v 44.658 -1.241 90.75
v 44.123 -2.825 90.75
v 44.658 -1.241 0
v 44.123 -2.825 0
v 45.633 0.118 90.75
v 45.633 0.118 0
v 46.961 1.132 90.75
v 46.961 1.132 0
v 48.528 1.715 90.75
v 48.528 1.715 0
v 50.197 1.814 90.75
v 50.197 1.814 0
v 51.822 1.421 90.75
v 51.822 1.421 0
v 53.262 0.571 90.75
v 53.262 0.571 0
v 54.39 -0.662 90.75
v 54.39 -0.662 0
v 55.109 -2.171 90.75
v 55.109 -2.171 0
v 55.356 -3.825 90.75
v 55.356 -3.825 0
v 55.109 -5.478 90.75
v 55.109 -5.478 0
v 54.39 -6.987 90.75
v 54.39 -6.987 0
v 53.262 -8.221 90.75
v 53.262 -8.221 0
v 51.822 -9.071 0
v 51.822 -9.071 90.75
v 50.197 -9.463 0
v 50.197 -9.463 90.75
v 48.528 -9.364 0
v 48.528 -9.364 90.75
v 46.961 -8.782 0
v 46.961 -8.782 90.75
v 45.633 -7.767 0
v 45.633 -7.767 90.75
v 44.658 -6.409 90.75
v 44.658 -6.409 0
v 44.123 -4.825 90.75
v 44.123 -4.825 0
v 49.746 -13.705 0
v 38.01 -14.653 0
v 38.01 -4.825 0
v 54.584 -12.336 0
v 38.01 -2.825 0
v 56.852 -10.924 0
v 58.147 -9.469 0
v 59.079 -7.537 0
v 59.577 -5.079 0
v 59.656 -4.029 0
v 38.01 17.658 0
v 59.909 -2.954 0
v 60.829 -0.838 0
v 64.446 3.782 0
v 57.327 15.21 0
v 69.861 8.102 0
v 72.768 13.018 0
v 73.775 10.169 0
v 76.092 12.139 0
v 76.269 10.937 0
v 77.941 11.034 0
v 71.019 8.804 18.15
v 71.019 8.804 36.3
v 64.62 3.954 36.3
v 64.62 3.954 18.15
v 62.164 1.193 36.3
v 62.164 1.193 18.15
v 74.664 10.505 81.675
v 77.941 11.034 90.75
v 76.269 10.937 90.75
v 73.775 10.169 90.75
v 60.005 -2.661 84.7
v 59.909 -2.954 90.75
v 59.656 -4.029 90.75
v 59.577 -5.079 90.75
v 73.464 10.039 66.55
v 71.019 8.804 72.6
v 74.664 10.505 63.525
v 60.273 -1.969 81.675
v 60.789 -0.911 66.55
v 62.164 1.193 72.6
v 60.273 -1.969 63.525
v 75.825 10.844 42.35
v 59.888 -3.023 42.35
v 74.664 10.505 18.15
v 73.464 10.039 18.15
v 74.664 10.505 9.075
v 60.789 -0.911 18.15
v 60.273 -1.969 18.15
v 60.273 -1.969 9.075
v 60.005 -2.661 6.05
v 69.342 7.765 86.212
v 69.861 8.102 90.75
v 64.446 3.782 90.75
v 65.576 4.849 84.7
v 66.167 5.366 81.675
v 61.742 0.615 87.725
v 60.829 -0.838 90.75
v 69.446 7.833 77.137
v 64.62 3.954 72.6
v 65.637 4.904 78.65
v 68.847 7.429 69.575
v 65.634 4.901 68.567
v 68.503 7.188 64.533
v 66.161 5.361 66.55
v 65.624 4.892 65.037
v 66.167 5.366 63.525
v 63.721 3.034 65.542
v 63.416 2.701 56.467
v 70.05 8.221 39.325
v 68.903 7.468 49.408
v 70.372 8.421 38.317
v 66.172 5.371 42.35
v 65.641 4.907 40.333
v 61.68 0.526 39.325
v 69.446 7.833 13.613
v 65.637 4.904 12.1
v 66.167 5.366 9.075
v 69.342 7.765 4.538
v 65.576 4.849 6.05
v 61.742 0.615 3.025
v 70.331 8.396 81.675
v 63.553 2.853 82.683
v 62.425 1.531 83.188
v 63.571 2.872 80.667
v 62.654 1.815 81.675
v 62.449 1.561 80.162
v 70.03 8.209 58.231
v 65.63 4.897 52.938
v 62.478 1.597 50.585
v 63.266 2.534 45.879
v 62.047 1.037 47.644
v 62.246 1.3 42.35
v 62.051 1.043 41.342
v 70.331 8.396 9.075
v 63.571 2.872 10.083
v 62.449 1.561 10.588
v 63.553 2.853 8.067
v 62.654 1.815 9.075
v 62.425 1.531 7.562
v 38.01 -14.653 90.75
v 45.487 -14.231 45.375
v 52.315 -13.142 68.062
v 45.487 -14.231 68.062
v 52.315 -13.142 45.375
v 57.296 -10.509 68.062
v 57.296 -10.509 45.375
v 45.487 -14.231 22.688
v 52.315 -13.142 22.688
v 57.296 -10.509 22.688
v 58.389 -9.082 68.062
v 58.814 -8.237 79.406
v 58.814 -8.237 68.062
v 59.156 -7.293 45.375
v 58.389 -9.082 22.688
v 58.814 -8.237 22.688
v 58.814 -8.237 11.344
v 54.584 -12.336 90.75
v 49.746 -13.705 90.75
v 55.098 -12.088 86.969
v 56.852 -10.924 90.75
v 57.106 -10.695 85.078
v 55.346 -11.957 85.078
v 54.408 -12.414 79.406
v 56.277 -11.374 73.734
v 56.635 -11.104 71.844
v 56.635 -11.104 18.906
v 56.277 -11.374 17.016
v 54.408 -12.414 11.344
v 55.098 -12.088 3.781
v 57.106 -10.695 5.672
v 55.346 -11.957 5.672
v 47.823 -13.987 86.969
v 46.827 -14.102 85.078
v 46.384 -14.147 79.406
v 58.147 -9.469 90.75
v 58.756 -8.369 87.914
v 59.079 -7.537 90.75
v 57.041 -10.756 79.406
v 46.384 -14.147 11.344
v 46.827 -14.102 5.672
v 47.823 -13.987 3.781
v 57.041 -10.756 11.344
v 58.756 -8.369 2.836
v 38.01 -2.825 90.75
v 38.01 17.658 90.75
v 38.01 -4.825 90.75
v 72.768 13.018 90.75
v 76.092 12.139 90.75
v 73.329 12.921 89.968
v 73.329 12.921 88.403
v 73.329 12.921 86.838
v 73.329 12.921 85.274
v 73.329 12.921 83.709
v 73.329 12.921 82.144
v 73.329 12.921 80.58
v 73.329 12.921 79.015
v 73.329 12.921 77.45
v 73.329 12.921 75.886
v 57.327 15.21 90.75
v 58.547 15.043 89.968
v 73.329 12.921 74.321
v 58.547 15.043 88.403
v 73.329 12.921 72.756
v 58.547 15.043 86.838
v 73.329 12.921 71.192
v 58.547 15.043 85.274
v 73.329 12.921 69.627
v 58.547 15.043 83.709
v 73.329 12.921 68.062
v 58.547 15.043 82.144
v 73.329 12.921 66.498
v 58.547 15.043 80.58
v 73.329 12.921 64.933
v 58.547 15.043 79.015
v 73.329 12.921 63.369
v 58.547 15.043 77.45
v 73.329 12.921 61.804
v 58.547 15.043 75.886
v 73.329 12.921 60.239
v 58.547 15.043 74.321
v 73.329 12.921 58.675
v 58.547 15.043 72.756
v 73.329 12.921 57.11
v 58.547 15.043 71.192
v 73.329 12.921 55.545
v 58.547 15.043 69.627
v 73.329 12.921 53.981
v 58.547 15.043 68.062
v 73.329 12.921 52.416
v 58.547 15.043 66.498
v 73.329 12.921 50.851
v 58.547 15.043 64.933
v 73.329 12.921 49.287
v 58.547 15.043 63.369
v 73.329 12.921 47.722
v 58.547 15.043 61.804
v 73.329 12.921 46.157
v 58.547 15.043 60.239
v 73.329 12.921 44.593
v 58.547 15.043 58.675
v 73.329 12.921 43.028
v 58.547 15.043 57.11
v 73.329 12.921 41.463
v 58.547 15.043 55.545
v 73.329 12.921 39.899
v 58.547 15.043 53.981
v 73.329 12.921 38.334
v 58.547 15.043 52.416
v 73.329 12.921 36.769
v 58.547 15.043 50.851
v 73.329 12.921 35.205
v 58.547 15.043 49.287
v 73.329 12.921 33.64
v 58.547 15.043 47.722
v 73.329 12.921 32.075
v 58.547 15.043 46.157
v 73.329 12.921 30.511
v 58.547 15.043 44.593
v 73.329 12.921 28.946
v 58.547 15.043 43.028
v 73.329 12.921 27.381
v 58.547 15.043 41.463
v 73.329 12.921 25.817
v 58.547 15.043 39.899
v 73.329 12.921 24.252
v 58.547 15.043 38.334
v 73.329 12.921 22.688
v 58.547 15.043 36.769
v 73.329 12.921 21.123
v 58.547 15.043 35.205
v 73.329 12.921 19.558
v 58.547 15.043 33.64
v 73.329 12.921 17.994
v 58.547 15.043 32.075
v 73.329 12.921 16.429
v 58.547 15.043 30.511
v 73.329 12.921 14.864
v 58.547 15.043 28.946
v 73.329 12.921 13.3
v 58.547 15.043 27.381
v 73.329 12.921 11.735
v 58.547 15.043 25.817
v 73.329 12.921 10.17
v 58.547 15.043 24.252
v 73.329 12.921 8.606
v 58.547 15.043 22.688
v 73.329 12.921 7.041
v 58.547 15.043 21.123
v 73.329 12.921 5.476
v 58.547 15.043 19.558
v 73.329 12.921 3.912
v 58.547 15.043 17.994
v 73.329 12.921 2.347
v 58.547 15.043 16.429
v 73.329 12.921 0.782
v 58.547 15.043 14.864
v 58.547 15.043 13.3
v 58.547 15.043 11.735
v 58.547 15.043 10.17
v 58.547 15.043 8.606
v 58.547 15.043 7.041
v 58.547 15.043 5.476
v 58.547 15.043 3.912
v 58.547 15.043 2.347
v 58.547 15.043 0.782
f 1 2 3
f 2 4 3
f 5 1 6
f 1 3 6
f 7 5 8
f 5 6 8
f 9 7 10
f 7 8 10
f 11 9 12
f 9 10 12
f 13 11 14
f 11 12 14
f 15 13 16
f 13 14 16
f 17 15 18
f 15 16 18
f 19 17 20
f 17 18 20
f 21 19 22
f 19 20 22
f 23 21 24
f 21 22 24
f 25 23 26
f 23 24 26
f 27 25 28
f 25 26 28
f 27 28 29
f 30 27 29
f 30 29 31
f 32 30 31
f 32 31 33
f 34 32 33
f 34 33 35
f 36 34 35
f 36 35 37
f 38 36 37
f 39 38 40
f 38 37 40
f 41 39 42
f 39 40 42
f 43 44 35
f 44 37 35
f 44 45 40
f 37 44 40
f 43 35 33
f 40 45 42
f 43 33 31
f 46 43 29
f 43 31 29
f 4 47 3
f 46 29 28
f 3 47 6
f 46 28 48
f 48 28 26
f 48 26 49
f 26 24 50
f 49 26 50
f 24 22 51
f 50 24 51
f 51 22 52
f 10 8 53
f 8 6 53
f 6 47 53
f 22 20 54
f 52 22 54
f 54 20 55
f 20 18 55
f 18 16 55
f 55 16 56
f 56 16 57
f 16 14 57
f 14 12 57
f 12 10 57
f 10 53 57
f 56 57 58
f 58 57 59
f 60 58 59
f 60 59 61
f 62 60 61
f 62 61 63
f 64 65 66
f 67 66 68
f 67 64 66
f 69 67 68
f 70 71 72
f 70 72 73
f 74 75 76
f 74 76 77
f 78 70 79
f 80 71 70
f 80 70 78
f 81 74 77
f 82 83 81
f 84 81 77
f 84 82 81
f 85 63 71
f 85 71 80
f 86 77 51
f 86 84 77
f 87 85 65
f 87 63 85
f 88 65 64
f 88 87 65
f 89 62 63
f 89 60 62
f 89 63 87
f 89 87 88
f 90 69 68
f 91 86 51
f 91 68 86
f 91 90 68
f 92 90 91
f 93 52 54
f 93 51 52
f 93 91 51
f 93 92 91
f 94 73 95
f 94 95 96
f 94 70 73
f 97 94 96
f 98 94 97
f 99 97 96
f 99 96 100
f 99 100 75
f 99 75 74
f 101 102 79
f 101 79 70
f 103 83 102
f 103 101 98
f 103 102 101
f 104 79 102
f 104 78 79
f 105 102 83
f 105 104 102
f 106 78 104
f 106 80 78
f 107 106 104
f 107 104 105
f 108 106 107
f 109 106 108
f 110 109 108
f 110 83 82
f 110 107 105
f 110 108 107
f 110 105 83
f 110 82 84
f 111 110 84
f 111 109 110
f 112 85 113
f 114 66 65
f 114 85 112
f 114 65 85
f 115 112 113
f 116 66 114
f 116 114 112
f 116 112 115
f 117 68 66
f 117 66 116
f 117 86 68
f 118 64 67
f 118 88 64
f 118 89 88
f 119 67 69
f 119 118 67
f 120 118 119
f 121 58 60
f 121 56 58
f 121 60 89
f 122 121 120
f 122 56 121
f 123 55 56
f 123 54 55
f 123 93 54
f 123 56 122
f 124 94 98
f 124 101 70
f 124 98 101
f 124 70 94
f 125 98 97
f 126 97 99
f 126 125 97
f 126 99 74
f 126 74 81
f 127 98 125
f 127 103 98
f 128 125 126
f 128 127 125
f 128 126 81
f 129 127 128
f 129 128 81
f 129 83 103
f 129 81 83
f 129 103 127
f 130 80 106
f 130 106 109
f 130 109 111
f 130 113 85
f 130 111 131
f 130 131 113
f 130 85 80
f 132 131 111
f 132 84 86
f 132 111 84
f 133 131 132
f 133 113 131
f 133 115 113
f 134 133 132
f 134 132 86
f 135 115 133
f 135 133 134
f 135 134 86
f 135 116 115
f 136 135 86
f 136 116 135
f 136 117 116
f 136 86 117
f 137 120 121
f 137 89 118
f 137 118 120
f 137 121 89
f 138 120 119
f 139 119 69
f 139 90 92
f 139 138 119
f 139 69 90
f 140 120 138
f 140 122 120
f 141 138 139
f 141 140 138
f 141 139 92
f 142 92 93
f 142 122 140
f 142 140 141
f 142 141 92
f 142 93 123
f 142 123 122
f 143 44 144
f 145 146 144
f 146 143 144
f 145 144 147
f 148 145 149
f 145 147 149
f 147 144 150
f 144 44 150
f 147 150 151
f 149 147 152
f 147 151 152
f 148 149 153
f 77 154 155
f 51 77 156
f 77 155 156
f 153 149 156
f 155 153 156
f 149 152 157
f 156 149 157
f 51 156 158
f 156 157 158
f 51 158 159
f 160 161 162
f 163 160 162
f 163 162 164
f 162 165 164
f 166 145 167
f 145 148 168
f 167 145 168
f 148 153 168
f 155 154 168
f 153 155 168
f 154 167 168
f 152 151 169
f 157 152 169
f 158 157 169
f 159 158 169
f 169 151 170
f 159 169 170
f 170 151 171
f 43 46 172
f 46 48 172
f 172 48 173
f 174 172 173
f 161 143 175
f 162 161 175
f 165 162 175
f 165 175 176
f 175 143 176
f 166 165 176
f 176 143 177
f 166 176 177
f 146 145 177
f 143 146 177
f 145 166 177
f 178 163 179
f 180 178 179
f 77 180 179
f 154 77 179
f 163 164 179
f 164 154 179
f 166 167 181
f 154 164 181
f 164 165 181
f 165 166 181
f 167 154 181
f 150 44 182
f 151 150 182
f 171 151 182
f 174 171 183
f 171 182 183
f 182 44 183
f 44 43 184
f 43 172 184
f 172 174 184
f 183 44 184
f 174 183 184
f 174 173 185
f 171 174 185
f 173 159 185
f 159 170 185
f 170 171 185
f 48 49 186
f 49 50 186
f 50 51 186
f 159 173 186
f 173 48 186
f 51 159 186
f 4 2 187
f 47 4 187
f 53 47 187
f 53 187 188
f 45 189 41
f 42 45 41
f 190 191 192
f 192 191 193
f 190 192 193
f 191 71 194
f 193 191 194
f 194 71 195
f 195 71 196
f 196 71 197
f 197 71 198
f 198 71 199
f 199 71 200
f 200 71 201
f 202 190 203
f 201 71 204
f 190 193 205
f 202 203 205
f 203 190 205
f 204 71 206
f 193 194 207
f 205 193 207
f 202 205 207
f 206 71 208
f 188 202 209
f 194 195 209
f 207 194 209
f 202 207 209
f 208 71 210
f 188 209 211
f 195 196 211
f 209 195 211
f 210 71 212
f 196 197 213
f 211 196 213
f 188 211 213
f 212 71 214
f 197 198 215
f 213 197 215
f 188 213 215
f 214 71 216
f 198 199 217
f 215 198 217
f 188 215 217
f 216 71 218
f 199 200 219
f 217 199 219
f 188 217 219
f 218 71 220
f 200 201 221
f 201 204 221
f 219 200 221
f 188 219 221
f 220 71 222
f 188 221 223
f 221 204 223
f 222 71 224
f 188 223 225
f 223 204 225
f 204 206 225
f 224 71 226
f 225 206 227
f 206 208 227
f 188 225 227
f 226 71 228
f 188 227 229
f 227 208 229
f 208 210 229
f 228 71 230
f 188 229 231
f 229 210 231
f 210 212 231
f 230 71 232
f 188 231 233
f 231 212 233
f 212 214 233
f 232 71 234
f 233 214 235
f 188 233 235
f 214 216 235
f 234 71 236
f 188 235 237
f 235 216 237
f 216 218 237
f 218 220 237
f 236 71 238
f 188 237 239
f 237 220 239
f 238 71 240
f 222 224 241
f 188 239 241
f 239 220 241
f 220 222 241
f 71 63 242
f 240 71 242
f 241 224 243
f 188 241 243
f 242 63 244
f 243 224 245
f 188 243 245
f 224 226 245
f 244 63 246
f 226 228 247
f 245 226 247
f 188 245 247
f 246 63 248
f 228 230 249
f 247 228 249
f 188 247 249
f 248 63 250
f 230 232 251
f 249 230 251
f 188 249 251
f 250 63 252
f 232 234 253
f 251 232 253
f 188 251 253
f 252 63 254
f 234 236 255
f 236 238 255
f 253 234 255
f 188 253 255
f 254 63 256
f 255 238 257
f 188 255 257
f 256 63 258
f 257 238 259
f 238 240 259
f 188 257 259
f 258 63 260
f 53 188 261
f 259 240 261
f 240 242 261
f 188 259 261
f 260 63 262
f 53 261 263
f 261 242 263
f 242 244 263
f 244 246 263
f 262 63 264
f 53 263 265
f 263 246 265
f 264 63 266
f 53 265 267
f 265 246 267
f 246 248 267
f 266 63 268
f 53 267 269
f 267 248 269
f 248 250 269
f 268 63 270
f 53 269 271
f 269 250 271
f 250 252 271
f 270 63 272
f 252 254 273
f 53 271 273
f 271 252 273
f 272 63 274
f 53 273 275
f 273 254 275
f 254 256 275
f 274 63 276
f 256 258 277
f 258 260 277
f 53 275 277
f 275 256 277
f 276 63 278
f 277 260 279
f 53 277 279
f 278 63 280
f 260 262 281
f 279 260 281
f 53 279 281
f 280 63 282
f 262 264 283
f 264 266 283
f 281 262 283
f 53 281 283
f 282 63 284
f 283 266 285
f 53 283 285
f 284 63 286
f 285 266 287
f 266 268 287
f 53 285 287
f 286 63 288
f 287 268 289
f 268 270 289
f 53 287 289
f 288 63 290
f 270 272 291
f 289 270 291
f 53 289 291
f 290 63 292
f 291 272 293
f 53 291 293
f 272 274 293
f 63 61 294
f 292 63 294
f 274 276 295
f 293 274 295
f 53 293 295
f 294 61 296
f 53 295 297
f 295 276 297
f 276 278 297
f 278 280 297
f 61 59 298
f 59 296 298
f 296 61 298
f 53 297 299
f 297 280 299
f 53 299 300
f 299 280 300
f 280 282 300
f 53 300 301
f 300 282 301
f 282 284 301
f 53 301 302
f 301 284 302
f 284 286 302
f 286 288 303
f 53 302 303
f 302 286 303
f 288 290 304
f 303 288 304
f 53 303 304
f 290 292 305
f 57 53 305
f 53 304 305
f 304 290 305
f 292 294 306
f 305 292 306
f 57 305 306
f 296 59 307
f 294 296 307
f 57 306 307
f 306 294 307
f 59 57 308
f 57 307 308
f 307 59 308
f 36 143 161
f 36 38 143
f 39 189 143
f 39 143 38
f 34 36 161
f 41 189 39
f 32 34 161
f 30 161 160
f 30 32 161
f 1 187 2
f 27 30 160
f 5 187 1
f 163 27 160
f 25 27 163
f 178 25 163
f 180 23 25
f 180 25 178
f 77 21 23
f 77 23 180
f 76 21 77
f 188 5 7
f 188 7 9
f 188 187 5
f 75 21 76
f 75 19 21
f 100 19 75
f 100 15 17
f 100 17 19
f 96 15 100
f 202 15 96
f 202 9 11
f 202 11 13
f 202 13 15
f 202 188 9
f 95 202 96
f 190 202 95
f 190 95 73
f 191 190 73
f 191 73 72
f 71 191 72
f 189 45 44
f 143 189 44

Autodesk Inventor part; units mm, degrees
ref_plane "YZ Plane" through (0, 0, 0) normal (1, 0, 0) x (0, 1, 0)
ref_plane "XZ Plane" through (0, 0, 0) normal (0, 1, 0) x (-1, 0, 0)
ref_plane "XY Plane" through (0, 0, 0) normal (0, 0, 1) x (1, 0, 0)
sketch "Sketch3" plane through (0, 0, 0) normal (0, 0, 1) x (1, 0, 0)
  line L0 (-80.5781, 0.8246) -> (-80.5781, 20.7988) construction
  circle A0 centre (-80.5781, 0.8246) radius 13.481
  line L1 (-53.7179, 12.5571) -> (-53.7179, -10.9927)
  arc A1 (-53.7179, -10.9927) -> (-51.5054, -12.9814) centre (-51.7179, -10.9927) ccw
  arc A2 (-51.5054, 14.5458) -> (-53.7179, 12.5571) centre (-51.7179, 12.5571) ccw
  line L2 (36.2229, -3.6088) -> (-51.5054, -12.9814)
  line L3 (38.0104, 3.1845) -> (38.0104, -1.6201)
  line L4 (-80.5781, 0.8246) -> (49.5525, 0.8246) construction
  circle A3 centre (49.6953, -3.8247) radius 5.6609
  line L5 (59.6953, 14.884) -> (59.6953, -12.7998) construction
  spline S0 degree 4 poles (77.9414, 11.0338) (75.5683, 12.9654) (71.7145, 13.0272) (66.8099, 13.9036) (60.7685, 14.7338) (56.2959, 15.3578) (51.7728, 15.9509) (47.2242, 16.5426) (42.6244, 17.1111) (37.9974, 17.6651) (33.3378, 18.1987) (28.6546, 18.7114) (23.9504, 19.2026) (19.2309, 19.6699) (14.5002, 20.1135) (9.7632, 20.5291) (5.025, 20.9191) (0.2903, 21.2792) (-4.4372, 21.6095) (-9.151, 21.9092) (-13.8524, 22.1766) (-18.5268, 22.4102) (-23.2002, 22.6105) (-27.8558, 22.7627) (-32.4748, 22.8704) (-37.0553, 22.9312) (-41.5904, 22.9454) (-46.0738, 22.9127) (-50.5027, 22.8323) (-54.8678, 22.7052) (-59.1755, 22.5324) (-63.394, 22.3084) (-67.5752, 22.0492) (-71.5451, 21.7209) (-75.7777, 21.4072) (-79.04, 20.9063) (-83.4863, 20.5541) (-87.0067, 20.037) (-90.7113, 19.5168) (-94.2172, 18.9459) (-97.6363, 18.3426) (-100.9342, 17.7015) (-104.1216, 17.0263) (-107.1909, 16.3187) (-110.1396, 15.5797) (-112.9656, 14.8117) (-115.6652, 14.0172) (-118.2357, 13.1965) (-120.6759, 12.3541) (-122.9817, 11.4895) (-125.1529, 10.6071) (-127.1857, 9.7065) (-129.0794, 8.7914) (-130.8324, 7.8633) (-132.4429, 6.923) (-133.9096, 5.9737) (-135.2322, 5.016) (-136.4083, 4.0508) (-137.4392, 3.0816) (-138.3215, 2.1025) (-139.0592, 1.1321) (-139.6407, 0.1249) (-140.106, -0.8362) (-140.3589, -2.0477) (-140.602, -2.598) (-140.1166, -5.4607) (-140.0539, -5.4622) (-139.4639, -6.7645) (-138.8842, -7.4979) (-138.1173, -8.3934) (-137.2199, -9.1877) (-136.1721, -9.9852) (-134.9893, -10.738) (-133.6669, -11.4655) (-132.2091, -12.1599) (-130.6156, -12.8245) (-128.8897, -13.4579) (-127.0312, -14.0591) (-125.0439, -14.6296) (-122.9287, -15.1678) (-120.6879, -15.6738) (-118.3241, -16.1476) (-115.8396, -16.5892) (-113.2366, -16.9984) (-110.5176, -17.3742) (-107.6861, -17.7183) (-104.7439, -18.0297) (-101.6943, -18.3095) (-98.5398, -18.5568) (-95.2843, -18.7732) (-91.9297, -18.9579) (-88.48, -19.1131) (-84.9381, -19.2376) (-81.3071, -19.3341) (-77.5906, -19.4015) (-73.7915, -19.4421) (-69.9139, -19.4561) (-65.961, -19.445) (-61.9362, -19.4102) (-57.8434, -19.3518) (-53.6861, -19.2727) (-49.4679, -19.1731) (-45.1932, -19.0538) (-40.8649, -18.9183) (-36.4879, -18.766) (-32.0649, -18.5992) (-27.598, -18.4192) (-23.0941, -18.227) (-18.5434, -18.0273) (-13.9382, -17.8076) (-9.3141, -17.5719) (-4.666, -17.3195) (-0.0002, -17.052) (4.6675, -16.7728) (9.3655, -16.4759) (14.0236, -16.1832) (19.545, -15.7815) (23.3079, -15.6072) (27.1098, -15.1781) (28.8959, -15.0599) knots 0 0 0 0 0 0.024672 0.034555 0.0445 0.054495 0.064543 0.074632 0.084755 0.094911 0.105094 0.115299 0.125521 0.135755 0.145995 0.156237 0.166475 0.176705 0.186921 0.197118 0.207299 0.217463 0.227605 0.23772 0.247796 0.257824 0.267798 0.277713 0.287563 0.297345 0.307053 0.31668 0.326224 0.335555 0.344908 0.354162 0.363308 0.372467 0.381393 0.390196 0.398872 0.407415 0.41582 0.424082 0.432193 0.44015 0.447945 0.455574 0.46303 0.470307 0.477401 0.484305 0.491015 0.497525 0.503831 0.509931 0.515822 0.521506 0.526986 0.53227 0.537373 0.542316 0.547131 0.552525 0.557529 0.562533 0.567581 0.57205 0.576988 0.582082 0.587354 0.592817 0.598478 0.604341 0.610406 0.616671 0.623133 0.629789 0.636632 0.643658 0.650861 0.658236 0.665777 0.673478 0.681333 0.689338 0.697486 0.705771 0.71419 0.722736 0.731403 0.740188 0.749084 0.758087 0.767192 0.776393 0.785687 0.795067 0.804529 0.814069 0.823682 0.833362 0.843106 0.852907 0.862763 0.872667 0.88262 0.892624 0.902675 0.912766 0.92289 0.933033 0.943191 0.953358 0.963531 0.973703 0.984092 1 1 1 1 1
  line L6 (7.5013, -16.4763) -> (50.2906, -13.6435) construction
  arc A4 (44.8353, -17.2546) -> (13.385, -19.3367) centre (31.5327, -54.8885) ccw construction
  line L7 (159.6953, -3.8066) -> (59.6953, -3.8066) construction
  line L8 (-51.5054, 14.5458) -> (36.2229, 5.1732)
  arc A5 (36.2229, -3.6088) -> (38.0104, -1.6201) centre (36.0104, -1.6201) ccw
  arc A6 (38.0104, 3.1845) -> (36.2229, 5.1732) centre (36.0104, 3.1845) ccw
  spline S1 degree 4 poles (78.1029, 11.0141) (76.6463, 11.2227) (73.9909, 10.5042) (70.2765, 8.6041) (66.0429, 5.3938) (62.3889, 1.8499) (60.314, -1.2467) (59.5572, -3.5763) (59.5773, -5.0793) knots 0 0 0 0 0 0.302475 0.43895 0.576633 0.708802 1 1 1 1 1
  spline S2 degree 4 poles (28.8959, -15.0599) (34.0984, -14.7105) (49.269, -14.182) (58.5645, -15.239) (59.5773, -5.0793) knots 0 0 0 0 0 1 1 1 1 1
  line L9 (28.8959, -15.0599) -> (34.0984, -14.7105) construction
  line L10 (34.0984, -14.7105) -> (49.269, -14.182) construction
  line L11 (49.269, -14.182) -> (58.5645, -15.239) construction
  line L12 (58.5645, -15.239) -> (59.5773, -5.0793) construction
  line L13 (-140.4646, -2.8394) -> (159.4818, -3.8173) construction
  line L14 (-132.0856, 0.6333) -> (-132.0856, -6.3667)
  line L15 (-132.0856, -6.3667) -> (-110.3816, -12.3574)
  line L16 (-110.3816, -12.3574) -> (-104.797, -12.3574)
  line L17 (-104.797, -12.3574) -> (-104.797, -18.0156)
  line L18 (-132.0856, 0.6333) -> (-110.3816, 10.553)
  line L19 (-110.3816, 10.553) -> (-104.1736, 10.553)
  line L20 (-104.1736, 10.553) -> (-104.1736, 17.0026)
  line L21 (38.0104, 0.8246) -> (38.0104, -14.6534)
  line L22 (38.0104, 0.8246) -> (38.0104, 17.6585)
  point P0 (0, 0)
  point P1 (17.6589, 23.5628)
  point P2 (75.883, 10.8572)
  point P3 (72.8647, 9.7686)
  point P4 (69.4179, 7.8149)
  point P5 (66.0452, 5.2617)
  point P6 (63.1887, 2.4463)
  point P7 (61.1228, -0.3317)
  point P8 (59.9357, -2.8689)
  point P9 (-160.0931, -3.8671)
  point P10 (28.8959, -15.0599)
  point P11 (69.5533, 13.4647)
  point P12 (65.1899, 14.1023)
  point P13 (60.7936, 14.7318)
  point P14 (56.3207, 15.3468)
  point P15 (51.7945, 15.947)
  point P16 (47.2398, 16.5346)
  point P17 (42.6414, 17.1053)
  point P18 (33.3491, 18.1925)
  point P19 (28.6632, 18.7055)
  point P20 (23.9568, 19.1966)
  point P21 (19.2348, 19.6643)
  point P22 (14.5017, 20.1074)
  point P23 (9.7623, 20.5238)
  point P24 (5.0217, 20.9132)
  point P25 (0.2844, 21.2735)
  point P26 (-4.4451, 21.6038)
  point P27 (-9.1614, 21.9032)
  point P28 (-13.86, 22.1702)
  point P29 (-18.5361, 22.4036)
  point P30 (-23.211, 22.601)
  point P31 (-27.8721, 22.754)
  point P32 (-32.4966, 22.8611)
  point P33 (-37.0797, 22.9217)
  point P34 (-41.6169, 22.9356)
  point P35 (-46.1028, 22.9023)
  point P36 (-50.5329, 22.8216)
  point P37 (-54.9021, 22.6941)
  point P38 (-59.2065, 22.5195)
  point P39 (-63.4406, 22.2977)
  point P40 (-67.6008, 22.0302)
  point P41 (-71.6806, 21.7165)
  point P42 (-75.6814, 21.3591)
  point P43 (-79.1834, 20.9458)
  point P44 (-83.4048, 20.5095)
  point P45 (-87.1309, 20.023)
  point P46 (-90.7527, 19.494)
  point P47 (-94.2725, 18.9266)
  point P48 (-97.6845, 18.3211)
  point P49 (-100.9861, 17.6791)
  point P50 (-107.2438, 16.2934)
  point P51 (-110.1931, 15.553)
  point P52 (-113.0194, 14.7835)
  point P53 (-115.7191, 13.987)
  point P54 (-118.2898, 13.165)
  point P55 (-120.7294, 12.3201)
  point P56 (-123.0349, 11.454)
  point P57 (-125.2048, 10.569)
  point P58 (-127.2364, 9.6666)
  point P59 (-129.1282, 8.7491)
  point P60 (-130.8786, 7.8185)
  point P61 (-132.486, 6.8762)
  point P62 (-133.9488, 5.9245)
  point P63 (-135.2661, 4.9648)
  point P64 (-136.4363, 3.9987)
  point P65 (-137.4592, 3.0275)
  point P66 (-138.3336, 2.0531)
  point P67 (-139.0591, 1.0763)
  point P68 (-139.6352, 0.0983)
  point P69 (-140.0613, -0.8802)
  point P70 (-140.338, -1.8576)
  point P71 (-140.1239, -5.2398)
  point P72 (-139.9547, -5.7022)
  point P73 (-139.492, -6.6066)
  point P74 (-138.8844, -7.4823)
  point P75 (-138.1328, -8.3292)
  point P76 (-137.2384, -9.147)
  point P77 (-136.202, -9.9355)
  point P78 (-135.0249, -10.6943)
  point P79 (-133.7085, -11.4228)
  point P80 (-132.2548, -12.1206)
  point P81 (-130.6648, -12.7879)
  point P82 (-128.941, -13.4239)
  point P83 (-127.0846, -14.0282)
  point P84 (-125.0983, -14.6009)
  point P85 (-122.9839, -15.1415)
  point P86 (-120.7435, -15.6497)
  point P87 (-118.3798, -16.1256)
  point P88 (-115.8952, -16.569)
  point P89 (-113.2918, -16.9797)
  point P90 (-110.5723, -17.3574)
  point P91 (-107.74, -17.7027)
  point P92 (-101.7463, -18.2964)
  point P93 (-98.5909, -18.5451)
  point P94 (-95.3341, -18.7623)
  point P95 (-91.9783, -18.9484)
  point P96 (-88.5271, -19.1041)
  point P97 (-84.9838, -19.2298)
  point P98 (-81.3514, -19.3267)
  point P99 (-77.6332, -19.3951)
  point P100 (-73.8324, -19.4362)
  point P101 (-69.9531, -19.4509)
  point P102 (-65.9985, -19.4404)
  point P103 (-61.9719, -19.4059)
  point P104 (-57.8772, -19.3483)
  point P105 (-53.718, -19.2694)
  point P106 (-49.4979, -19.1701)
  point P107 (-45.2211, -19.0516)
  point P108 (-40.8909, -18.916)
  point P109 (-36.5118, -18.7642)
  point P110 (-32.0871, -18.5977)
  point P111 (-27.6213, -18.418)
  point P112 (-23.1183, -18.2269)
  point P113 (-18.5646, -18.0247)
  point P114 (-13.9566, -17.8054)
  point P115 (-9.3252, -17.5693)
  point P116 (-4.674, -17.317)
  point P117 (-0.0078, -17.05)
  point P118 (4.6686, -16.7695)
  point P119 (9.3513, -16.477)
  point P120 (14.0352, -16.1731)
  point P121 (18.7161, -15.8596)
  point P122 (23.3889, -15.5371)
  point P123 (78.0825, 12.164)
  point P124 (159.2574, -3.8401)
  point P125 (158.8836, -3.8779)
  point P126 (158.3607, -3.9307)
  point P127 (157.6896, -3.9985)
  point P128 (156.8706, -4.081)
  point P129 (155.9046, -4.1779)
  point P130 (154.7931, -4.2892)
  point P131 (153.5367, -4.4143)
  point P132 (152.1372, -4.5532)
  point P133 (150.5955, -4.7056)
  point P134 (148.914, -4.8712)
  point P135 (147.0936, -5.0494)
  point P136 (145.137, -5.2399)
  point P137 (143.0457, -5.4421)
  point P138 (140.8221, -5.6563)
  point P139 (138.4686, -5.8813)
  point P140 (135.9876, -6.1174)
  point P141 (133.3815, -6.3634)
  point P142 (130.6533, -6.6196)
  point P143 (127.8054, -6.8851)
  point P144 (124.8414, -7.1596)
  point P145 (121.7634, -7.4428)
  point P146 (118.5756, -7.7341)
  point P147 (115.2804, -8.0332)
  point P148 (111.8817, -8.3395)
  point P149 (108.3828, -8.6527)
  point P150 (104.787, -8.9722)
  point P151 (101.0985, -9.2974)
  point P152 (97.3206, -9.6283)
  point P153 (93.4572, -9.9643)
  point P154 (89.5122, -10.3048)
  point P155 (85.4898, -10.6492)
  point P156 (81.3936, -10.9969)
  point P157 (77.2284, -11.3479)
  point P158 (72.9975, -11.701)
  point P159 (68.7057, -12.0556)
  point P160 (64.3572, -12.4117)
  point P161 (59.9559, -12.7678)
  point P162 (55.5069, -13.1239)
  point P163 (51.0138, -13.4788)
  point P164 (46.4817, -13.8316)
  point P165 (41.9148, -14.182)
  point P166 (35.7035, -14.3277)
  point P167 (32.6946, -14.8708)
  point P168 (82.2459, 11.5043)
  point P169 (86.3364, 10.8401)
  point P170 (90.3495, 10.1732)
  point P171 (94.2816, 9.5051)
  point P172 (98.1288, 8.837)
  point P173 (101.8872, 8.171)
  point P174 (105.5538, 7.5086)
  point P175 (109.1244, 6.8507)
  point P176 (112.596, 6.1997)
  point P177 (115.9653, 5.5565)
  point P178 (119.2287, 4.9229)
  point P179 (122.3835, 4.3007)
  point P180 (125.4264, 3.6911)
  point P181 (128.3547, 3.0956)
  point P182 (131.1654, 2.5157)
  point P183 (133.8561, 1.9532)
  point P184 (136.4244, 1.4093)
  point P185 (138.8676, 0.8855)
  point P186 (141.1833, 0.383)
  point P187 (143.3697, -0.0964)
  point P188 (145.4247, -0.5518)
  point P189 (147.3462, -0.9817)
  point P190 (149.1327, -1.3852)
  point P191 (150.7821, -1.7608)
  point P192 (152.2935, -2.1073)
  point P193 (153.6651, -2.4241)
  point P194 (154.8954, -2.7103)
  point P195 (155.9838, -2.9647)
  point P196 (156.9291, -3.187)
  point P197 (157.7307, -3.376)
  point P198 (158.3871, -3.5317)
  point P199 (158.8986, -3.6529)
  dimension "d3" = 26.962
  dimension "d6" = 11.3219
  dimension "d7" = 110
  dimension "d8" = 100
  dimension "d9" = 2
  dimension "d11" = 4.6493
  dimension "d25" = 7
  dimension "d26" = 3.5
  dimension "d27" = 8.379
  dimension "d28" = 30.083
  dimension "d29" = 5
  dimension "d30" = 5
  dimension "d31" = 59.8865
extrude "Extrusion3" add sketch "Sketch3" along normal blind 90.75 contours L22 S0 S1 S2 L21 L3
sketch "Sketch4" plane through (0, 0, 90.75) normal (0, 0, 1) x (1, 0, 0)
  circle A0 centre (49.6953, -3.8247) radius 5.6609 projected
  line L0 (44.0343, -3.8247) -> (38.0104, -3.8247) construction
  line L1 (38.0104, 17.6585) -> (38.0104, -14.6534) projected
  line L2 (44.5647, -2.8247) -> (37.4801, -2.8247)
  line L3 (37.4801, -2.8247) -> (37.4801, -4.8247)
  line L4 (37.4801, -4.8247) -> (44.5647, -4.8247)
  line L5 (44.5647, -4.8247) -> (44.5647, -2.8247)
  line L6 (44.5647, -2.8247) -> (37.4801, -4.8247) construction
  line L7 (37.4801, -2.8247) -> (44.5647, -4.8247) construction
  point P0 (0, 0)
  point P1 (41.0224, -3.8247)
  dimension "d34" = 2
extrude "Extrusion4" cut sketch "Sketch4" against normal blind 154.75 contours L2 L5 L4 A0 | A0 L4 L1 L2 | L1 L4 L3 L2 picked at (44.3912, -3.9363)
properties part number "4P.01.01.11-TW-v1-WingRibWFlapSingle" material "Polyurethane Foam"
